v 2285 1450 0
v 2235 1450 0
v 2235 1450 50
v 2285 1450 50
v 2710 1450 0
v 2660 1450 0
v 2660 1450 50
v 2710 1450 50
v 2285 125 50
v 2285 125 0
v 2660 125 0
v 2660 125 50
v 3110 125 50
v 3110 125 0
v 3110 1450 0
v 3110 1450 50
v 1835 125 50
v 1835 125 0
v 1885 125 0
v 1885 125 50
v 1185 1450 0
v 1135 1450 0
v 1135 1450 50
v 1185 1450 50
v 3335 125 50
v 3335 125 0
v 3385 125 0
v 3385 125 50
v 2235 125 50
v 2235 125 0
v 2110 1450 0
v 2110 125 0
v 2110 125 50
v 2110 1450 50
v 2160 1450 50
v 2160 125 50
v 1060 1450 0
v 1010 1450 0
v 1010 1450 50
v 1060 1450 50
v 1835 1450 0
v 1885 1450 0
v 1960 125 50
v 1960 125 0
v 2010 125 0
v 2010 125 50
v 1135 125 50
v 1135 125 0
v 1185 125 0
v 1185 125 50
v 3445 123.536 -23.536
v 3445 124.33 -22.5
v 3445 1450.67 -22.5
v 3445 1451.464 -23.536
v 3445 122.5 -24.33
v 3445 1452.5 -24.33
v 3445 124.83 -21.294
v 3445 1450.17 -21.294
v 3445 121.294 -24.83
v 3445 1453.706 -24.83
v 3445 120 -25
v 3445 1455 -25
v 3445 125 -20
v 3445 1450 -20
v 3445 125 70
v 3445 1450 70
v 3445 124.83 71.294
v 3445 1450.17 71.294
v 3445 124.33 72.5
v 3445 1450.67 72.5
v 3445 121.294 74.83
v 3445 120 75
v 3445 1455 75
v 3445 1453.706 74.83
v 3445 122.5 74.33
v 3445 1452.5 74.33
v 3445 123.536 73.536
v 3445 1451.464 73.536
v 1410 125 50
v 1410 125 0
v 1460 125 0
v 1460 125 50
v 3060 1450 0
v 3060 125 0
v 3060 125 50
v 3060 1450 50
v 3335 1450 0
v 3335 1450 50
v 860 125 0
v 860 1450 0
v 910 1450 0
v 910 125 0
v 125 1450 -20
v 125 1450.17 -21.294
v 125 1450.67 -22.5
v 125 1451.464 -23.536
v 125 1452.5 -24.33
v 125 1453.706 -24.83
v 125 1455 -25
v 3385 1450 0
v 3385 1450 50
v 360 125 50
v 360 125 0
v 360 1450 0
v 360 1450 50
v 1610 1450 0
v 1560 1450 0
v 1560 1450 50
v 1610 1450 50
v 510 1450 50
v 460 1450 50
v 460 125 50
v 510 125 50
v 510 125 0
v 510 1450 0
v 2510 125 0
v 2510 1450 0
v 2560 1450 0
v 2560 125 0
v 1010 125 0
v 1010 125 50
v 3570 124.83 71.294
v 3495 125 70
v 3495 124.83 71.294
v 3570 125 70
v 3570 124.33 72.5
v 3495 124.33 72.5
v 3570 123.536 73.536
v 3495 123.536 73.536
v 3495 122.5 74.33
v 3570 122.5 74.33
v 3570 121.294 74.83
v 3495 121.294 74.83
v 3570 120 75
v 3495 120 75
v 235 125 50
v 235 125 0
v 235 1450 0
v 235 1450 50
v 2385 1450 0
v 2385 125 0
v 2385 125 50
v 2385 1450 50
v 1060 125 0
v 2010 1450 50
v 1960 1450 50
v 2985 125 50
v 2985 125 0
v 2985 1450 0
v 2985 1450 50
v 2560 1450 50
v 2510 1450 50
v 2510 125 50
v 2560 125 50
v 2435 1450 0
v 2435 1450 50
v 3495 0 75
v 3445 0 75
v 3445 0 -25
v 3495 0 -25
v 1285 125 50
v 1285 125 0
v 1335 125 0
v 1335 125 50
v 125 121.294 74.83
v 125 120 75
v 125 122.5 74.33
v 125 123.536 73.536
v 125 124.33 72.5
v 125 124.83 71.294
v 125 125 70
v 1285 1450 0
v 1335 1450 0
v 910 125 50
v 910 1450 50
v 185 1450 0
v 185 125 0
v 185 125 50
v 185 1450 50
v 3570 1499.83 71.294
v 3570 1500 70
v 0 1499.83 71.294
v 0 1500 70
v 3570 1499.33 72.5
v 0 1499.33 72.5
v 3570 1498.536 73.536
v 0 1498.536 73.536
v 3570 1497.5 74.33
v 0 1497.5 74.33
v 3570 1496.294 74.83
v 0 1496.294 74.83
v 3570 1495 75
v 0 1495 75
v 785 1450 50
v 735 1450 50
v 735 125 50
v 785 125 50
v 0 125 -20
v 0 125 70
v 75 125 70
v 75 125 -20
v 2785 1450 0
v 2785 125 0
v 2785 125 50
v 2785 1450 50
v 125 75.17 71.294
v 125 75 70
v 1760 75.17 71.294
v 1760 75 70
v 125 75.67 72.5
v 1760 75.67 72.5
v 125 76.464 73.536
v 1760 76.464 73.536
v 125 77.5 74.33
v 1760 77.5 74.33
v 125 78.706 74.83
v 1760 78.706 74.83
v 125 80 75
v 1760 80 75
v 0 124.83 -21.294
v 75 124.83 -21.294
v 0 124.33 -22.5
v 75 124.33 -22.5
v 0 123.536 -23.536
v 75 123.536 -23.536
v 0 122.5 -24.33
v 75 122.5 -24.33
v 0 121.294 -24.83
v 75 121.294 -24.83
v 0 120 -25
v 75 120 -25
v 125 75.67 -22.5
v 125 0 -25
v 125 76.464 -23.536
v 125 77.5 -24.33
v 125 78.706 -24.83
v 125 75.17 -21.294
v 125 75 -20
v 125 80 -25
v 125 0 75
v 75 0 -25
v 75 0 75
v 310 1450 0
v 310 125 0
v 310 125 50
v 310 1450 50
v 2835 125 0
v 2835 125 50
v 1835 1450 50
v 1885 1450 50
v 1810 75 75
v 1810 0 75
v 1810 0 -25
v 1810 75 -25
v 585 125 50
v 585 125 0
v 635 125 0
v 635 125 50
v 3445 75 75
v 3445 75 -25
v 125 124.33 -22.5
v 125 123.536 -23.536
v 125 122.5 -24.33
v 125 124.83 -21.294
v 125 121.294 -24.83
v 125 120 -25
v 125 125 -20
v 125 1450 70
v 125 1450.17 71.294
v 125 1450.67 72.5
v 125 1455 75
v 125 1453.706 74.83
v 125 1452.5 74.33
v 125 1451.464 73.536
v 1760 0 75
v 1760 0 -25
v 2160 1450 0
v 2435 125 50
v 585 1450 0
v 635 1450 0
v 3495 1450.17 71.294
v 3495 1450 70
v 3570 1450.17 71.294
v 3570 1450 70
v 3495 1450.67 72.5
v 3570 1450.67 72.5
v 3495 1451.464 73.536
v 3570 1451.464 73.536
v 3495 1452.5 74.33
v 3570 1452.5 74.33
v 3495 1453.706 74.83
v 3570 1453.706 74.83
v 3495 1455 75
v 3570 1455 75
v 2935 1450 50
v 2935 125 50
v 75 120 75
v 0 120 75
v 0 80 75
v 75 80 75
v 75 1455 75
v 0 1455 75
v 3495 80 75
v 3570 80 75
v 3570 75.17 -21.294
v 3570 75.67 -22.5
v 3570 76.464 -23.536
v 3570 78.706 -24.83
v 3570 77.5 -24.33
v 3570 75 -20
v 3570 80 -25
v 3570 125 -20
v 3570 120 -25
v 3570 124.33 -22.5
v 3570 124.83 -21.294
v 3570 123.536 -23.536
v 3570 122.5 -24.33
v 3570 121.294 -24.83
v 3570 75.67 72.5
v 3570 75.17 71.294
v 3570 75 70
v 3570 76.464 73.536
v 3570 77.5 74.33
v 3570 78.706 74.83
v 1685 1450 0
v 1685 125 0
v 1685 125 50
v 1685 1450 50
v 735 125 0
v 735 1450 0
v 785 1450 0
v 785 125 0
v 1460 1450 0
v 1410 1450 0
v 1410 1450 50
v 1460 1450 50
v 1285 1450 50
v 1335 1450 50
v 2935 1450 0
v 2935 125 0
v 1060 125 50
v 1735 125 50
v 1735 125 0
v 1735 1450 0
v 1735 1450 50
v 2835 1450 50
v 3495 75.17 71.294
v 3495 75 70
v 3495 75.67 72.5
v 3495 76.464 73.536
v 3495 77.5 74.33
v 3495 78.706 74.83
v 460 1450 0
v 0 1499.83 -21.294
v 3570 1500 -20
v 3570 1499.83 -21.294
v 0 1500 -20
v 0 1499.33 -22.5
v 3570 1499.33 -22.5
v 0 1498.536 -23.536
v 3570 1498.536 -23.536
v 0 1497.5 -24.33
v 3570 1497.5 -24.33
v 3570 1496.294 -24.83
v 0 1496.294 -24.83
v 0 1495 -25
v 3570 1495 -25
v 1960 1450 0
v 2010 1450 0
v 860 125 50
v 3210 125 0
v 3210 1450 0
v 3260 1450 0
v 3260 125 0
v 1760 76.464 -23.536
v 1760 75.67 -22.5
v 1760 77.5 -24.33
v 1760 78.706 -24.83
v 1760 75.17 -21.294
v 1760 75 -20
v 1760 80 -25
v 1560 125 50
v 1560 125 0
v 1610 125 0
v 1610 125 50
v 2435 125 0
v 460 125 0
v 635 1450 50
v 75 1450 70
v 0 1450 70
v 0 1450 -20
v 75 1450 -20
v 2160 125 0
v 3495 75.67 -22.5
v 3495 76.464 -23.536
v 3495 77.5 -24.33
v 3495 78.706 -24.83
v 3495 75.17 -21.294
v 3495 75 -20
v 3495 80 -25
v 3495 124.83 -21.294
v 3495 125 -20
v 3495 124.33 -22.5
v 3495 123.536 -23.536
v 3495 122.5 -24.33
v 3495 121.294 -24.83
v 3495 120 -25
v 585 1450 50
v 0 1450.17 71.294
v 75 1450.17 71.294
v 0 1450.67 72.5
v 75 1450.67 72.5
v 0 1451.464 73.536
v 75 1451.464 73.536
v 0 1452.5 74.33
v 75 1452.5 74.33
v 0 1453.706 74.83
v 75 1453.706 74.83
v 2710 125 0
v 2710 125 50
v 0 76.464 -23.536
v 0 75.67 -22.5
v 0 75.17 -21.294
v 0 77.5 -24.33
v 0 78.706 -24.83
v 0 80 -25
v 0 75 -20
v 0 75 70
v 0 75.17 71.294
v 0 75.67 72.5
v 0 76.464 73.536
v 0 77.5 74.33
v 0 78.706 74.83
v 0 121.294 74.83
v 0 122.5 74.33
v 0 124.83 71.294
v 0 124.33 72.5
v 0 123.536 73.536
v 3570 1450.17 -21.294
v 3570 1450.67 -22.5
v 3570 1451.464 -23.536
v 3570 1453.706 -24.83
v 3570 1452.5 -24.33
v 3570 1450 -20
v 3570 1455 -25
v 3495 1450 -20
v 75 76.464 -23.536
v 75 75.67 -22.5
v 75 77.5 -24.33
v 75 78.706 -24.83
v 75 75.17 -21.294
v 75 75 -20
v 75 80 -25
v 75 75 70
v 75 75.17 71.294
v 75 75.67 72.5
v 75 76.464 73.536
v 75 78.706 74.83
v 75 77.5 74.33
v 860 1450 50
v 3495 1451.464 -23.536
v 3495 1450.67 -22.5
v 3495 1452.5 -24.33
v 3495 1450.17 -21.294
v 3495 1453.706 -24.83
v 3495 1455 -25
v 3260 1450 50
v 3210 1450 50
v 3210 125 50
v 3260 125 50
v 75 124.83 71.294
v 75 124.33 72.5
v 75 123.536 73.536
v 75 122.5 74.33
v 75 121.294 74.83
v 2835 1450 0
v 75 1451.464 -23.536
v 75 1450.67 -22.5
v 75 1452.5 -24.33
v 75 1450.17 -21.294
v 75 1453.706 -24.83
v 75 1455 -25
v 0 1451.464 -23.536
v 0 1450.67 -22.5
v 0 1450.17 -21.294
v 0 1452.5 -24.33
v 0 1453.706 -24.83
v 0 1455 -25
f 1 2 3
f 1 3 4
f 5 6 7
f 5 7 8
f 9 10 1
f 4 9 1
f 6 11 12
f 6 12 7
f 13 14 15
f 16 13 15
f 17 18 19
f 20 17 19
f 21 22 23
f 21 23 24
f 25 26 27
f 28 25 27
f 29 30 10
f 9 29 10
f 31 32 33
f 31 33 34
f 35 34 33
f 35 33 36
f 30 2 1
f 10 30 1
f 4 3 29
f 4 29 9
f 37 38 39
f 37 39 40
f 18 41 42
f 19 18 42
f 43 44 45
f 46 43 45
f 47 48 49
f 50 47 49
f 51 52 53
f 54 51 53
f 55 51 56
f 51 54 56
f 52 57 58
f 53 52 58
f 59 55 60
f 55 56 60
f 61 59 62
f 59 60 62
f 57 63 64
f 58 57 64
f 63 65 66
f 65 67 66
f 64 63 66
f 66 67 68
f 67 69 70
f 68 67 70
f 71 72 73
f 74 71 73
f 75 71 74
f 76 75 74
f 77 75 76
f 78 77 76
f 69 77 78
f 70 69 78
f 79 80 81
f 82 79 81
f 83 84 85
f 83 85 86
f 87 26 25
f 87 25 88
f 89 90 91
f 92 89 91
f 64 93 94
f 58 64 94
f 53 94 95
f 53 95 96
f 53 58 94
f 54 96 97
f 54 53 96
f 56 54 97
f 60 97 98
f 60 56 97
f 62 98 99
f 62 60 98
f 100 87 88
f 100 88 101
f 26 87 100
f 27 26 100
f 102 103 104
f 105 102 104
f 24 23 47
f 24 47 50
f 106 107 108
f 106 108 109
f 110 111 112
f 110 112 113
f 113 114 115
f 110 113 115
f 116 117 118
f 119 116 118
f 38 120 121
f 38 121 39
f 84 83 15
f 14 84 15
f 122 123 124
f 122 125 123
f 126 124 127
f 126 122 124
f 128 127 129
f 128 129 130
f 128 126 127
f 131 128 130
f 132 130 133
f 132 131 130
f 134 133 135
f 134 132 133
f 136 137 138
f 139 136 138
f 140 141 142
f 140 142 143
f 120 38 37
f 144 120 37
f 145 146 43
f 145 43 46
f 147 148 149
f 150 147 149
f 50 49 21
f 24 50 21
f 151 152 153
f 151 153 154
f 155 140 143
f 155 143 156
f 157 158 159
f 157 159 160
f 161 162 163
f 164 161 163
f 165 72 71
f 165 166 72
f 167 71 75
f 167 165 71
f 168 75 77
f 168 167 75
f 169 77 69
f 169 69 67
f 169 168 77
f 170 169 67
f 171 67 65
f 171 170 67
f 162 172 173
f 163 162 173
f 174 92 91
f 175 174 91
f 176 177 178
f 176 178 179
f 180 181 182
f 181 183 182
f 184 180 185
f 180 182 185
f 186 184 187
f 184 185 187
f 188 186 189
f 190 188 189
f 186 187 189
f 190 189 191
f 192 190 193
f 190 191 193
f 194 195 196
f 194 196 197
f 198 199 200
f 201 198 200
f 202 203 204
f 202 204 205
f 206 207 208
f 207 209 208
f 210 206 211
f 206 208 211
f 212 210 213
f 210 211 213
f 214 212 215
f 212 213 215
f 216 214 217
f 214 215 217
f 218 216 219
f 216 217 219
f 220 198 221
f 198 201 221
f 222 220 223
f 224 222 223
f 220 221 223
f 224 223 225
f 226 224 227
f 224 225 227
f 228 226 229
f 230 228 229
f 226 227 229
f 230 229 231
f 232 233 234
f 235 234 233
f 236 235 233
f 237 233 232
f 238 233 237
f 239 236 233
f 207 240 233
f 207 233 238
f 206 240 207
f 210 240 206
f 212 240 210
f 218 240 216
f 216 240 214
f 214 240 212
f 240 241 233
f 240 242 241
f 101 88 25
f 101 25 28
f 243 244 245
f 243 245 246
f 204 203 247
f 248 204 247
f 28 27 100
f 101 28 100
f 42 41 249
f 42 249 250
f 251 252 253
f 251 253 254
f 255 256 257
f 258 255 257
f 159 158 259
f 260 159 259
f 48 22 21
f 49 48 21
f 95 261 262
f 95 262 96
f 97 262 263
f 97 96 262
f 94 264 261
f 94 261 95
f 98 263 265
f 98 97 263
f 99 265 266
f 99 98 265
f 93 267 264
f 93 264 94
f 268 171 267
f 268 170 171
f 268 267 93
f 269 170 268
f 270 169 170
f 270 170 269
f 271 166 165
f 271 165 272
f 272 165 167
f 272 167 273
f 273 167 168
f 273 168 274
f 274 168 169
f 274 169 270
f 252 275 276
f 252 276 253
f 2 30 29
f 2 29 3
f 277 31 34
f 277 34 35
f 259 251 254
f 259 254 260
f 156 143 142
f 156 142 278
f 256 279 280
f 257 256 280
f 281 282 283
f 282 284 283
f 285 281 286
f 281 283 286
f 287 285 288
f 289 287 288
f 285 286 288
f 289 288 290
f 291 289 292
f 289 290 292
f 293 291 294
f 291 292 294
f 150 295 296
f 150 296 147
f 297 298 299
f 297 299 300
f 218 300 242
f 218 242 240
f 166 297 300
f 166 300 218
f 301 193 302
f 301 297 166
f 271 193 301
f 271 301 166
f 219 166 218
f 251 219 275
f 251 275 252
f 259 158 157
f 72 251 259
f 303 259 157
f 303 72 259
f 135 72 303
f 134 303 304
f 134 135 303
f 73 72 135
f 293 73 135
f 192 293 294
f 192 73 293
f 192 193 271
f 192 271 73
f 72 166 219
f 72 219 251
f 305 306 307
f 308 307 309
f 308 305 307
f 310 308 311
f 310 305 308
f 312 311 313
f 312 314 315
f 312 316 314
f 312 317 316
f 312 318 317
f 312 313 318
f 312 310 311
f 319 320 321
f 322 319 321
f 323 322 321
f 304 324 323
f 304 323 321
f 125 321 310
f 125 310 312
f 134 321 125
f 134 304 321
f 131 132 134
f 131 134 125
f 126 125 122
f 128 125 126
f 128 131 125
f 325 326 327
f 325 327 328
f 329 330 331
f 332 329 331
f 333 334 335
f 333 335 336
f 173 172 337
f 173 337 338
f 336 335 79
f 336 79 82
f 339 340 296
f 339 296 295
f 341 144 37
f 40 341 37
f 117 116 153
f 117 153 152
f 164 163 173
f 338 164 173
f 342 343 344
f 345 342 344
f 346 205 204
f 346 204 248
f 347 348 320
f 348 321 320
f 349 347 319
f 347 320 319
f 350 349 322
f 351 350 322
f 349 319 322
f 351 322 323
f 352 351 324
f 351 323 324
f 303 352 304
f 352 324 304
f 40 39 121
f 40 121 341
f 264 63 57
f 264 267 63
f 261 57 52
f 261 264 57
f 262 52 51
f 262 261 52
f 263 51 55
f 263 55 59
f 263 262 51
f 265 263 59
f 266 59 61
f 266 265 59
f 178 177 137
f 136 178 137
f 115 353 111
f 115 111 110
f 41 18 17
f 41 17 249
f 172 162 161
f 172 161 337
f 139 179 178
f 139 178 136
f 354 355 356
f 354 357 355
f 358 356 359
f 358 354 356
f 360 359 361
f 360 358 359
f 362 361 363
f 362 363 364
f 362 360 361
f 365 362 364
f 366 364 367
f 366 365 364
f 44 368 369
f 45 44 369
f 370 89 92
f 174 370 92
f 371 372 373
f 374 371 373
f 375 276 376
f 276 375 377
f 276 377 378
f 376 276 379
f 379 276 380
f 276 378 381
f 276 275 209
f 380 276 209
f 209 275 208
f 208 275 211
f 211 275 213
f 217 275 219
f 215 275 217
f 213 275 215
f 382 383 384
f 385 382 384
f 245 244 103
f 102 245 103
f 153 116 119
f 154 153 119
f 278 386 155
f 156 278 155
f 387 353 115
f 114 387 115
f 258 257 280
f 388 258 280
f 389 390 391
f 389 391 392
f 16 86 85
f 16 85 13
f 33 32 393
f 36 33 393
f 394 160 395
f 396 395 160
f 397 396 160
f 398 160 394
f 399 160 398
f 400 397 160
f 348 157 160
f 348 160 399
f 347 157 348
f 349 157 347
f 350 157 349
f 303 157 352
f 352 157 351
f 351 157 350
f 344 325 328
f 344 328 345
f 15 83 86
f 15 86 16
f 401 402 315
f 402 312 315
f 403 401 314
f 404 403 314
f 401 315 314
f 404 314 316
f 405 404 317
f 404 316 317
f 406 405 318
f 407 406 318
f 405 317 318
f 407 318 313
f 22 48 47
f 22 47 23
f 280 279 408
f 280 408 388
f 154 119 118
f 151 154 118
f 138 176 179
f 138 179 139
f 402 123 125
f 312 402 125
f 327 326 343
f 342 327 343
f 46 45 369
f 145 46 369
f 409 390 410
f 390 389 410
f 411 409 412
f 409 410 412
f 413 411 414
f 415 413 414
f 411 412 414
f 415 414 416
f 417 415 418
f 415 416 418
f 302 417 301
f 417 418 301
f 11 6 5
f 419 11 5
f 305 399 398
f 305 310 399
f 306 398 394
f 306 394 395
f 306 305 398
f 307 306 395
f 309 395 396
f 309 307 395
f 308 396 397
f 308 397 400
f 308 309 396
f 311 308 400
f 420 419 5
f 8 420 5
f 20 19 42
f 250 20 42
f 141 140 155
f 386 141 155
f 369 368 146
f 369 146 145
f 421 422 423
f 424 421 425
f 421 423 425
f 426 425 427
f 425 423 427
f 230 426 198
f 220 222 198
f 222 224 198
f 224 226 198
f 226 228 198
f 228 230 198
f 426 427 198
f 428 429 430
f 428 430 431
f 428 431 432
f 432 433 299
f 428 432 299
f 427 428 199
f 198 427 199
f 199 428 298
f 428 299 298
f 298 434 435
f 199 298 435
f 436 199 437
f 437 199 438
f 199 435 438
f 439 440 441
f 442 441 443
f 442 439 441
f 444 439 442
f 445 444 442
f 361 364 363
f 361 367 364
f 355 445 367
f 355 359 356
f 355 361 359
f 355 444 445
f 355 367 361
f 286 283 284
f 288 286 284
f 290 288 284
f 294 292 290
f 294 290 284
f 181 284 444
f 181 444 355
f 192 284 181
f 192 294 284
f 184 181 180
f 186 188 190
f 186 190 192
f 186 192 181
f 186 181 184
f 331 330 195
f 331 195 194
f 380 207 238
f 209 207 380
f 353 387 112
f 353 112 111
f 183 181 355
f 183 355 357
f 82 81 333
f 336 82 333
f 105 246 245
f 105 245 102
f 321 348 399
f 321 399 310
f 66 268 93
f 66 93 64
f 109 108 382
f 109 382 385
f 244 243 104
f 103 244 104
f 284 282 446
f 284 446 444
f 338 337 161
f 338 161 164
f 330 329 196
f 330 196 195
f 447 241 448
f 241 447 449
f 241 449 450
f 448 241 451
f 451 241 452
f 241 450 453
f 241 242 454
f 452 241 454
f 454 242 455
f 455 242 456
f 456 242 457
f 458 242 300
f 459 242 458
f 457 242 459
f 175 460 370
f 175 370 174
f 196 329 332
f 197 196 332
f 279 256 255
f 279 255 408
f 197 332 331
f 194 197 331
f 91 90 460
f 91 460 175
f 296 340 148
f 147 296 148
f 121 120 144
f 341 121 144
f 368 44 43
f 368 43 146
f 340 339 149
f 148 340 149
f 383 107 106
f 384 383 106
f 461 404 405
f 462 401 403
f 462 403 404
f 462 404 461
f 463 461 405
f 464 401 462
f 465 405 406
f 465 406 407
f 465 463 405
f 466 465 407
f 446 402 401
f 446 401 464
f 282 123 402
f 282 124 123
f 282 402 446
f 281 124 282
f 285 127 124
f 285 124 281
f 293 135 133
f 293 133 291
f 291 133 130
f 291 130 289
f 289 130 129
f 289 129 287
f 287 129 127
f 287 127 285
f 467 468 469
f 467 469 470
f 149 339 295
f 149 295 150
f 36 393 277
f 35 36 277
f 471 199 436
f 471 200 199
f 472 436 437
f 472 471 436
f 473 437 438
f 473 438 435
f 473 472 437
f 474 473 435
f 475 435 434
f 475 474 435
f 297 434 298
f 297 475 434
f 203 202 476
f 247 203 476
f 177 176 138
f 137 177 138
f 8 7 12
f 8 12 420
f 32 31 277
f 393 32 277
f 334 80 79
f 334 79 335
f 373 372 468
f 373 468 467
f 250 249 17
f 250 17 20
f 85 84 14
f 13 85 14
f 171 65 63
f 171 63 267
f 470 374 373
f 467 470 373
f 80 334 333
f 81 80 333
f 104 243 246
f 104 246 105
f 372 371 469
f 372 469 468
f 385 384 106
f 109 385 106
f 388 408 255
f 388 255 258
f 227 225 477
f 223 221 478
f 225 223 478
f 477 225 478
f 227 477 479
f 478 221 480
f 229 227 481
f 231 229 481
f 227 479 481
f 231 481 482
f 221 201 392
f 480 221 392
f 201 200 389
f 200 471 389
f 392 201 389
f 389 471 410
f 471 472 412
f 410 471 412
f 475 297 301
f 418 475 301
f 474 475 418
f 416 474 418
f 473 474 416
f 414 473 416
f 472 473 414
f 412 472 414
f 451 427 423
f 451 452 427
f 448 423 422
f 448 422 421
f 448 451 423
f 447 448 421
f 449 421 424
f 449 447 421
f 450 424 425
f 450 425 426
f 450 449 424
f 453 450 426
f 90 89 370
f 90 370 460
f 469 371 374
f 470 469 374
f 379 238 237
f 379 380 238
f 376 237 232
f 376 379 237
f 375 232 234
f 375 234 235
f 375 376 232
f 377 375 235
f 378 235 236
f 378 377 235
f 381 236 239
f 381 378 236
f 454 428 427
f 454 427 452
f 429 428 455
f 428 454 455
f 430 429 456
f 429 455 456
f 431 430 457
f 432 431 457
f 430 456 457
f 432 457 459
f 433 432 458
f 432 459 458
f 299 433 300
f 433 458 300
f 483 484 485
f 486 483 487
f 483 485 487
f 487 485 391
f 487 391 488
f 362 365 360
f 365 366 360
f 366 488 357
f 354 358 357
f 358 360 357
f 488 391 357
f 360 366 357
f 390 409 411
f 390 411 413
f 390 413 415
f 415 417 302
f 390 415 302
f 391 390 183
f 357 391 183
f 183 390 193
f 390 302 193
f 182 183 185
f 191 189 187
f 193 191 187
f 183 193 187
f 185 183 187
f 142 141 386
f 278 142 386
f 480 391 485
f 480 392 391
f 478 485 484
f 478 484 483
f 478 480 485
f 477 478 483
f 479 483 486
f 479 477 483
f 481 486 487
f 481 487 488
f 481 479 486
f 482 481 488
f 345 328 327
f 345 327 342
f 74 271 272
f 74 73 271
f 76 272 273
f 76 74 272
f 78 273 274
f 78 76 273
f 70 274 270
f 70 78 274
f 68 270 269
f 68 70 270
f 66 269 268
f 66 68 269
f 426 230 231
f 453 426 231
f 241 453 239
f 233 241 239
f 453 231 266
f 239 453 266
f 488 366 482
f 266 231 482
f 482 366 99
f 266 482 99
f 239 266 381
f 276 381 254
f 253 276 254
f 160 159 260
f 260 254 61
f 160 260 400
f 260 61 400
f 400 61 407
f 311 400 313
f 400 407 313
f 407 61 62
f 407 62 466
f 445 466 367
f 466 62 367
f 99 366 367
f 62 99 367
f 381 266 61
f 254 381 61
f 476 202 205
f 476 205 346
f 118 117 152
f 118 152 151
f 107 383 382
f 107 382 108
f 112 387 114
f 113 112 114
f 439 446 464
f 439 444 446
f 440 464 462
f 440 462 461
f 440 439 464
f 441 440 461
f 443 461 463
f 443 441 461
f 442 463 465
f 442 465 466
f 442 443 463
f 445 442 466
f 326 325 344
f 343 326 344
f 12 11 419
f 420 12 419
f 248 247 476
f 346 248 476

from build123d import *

# Parameters (mm, degrees)
F0_W          = 75
F0_H          = 50
F0_W_2        = 50
F0_W_3        = 3320
F0_H_2        = 1325
F0_H_3        = 75
F1_DEPTH      = 75
F1_DEPTH_BACK = 25
F2_R          = 5
F3_W          = 50
F3_H          = 1325
F4_DEPTH      = 50


with BuildPart() as f1:
    # F0 (on Top) → F1 (new body, two sides)
    with BuildSketch(Plane.XY) as f1_sk:
        with Locations((37.5, 1475)):
            Rectangle(F0_W, F0_H)
        with Locations((100, 1475)):
            Rectangle(F0_W_2, F0_H)
        with Locations((1785, 1475)):
            Rectangle(F0_W_3, F0_H)
        with Locations((100, 787.5)):
            Rectangle(F0_W_2, F0_H_2)
        with Locations((3470, 1475)):
            Rectangle(F0_W_2, F0_H)
        with Locations((37.5, 100)):
            Rectangle(F0_W, F0_H)
        with Locations((100, 100)):
            Rectangle(F0_W_2, F0_H)
        with Locations((3532.5, 1475)):
            Rectangle(F0_W, F0_H)
        with Locations((3470, 787.5)):
            Rectangle(F0_W_2, F0_H_2)
        Polygon((3445, 125), (125, 125), (125, 75), (1760, 75), (1810, 75), (3445, 75), align=None)
        with Locations((100, 37.5)):
            Rectangle(F0_W_2, F0_H_3)
        with Locations((3470, 100)):
            Rectangle(F0_W_2, F0_H)
        with Locations((3532.5, 100)):
            Rectangle(F0_W, F0_H)
        with Locations((3470, 37.5)):
            Rectangle(F0_W_2, F0_H_3)
        with Locations((1785, 37.5)):
            Rectangle(F0_W_2, F0_H_3)
    extrude(amount=F1_DEPTH)
    extrude(f1_sk.sketch, amount=-F1_DEPTH_BACK)

    # F2
    f2_edges = [f1.edges().sort_by_distance(p)[0] for p in [
        (1785, 1450, 75),
        (1785, 1500, 75),
        (1785, 125, 75),
        (942.5, 75, 75),
        (37.5, 75, 75),
        (37.5, 125, 75),
        (3532.5, 125, 75),
        (3532.5, 75, 75),
        (3532.5, 1450, 75),
        (37.5, 1450, 75),
        (1785, 1500, -25),
        (1785, 1450, -25),
        (3532.5, 1450, -25),
        (3532.5, 75, -25),
        (3532.5, 125, -25),
        (1785, 125, -25),
        (942.5, 75, -25),
        (37.5, 125, -25),
        (37.5, 75, -25),
        (37.5, 1450, -25),
    ]]
    fillet(f2_edges, radius=F2_R)


with BuildPart() as f4:
    # F3 (on Top) → F4 (new body)
    with BuildSketch(Plane.XY):
        with Locations((210, 787.5)):
            Rectangle(F3_W, F3_H)
    extrude(amount=F4_DEPTH)


with BuildPart() as f4b:
    # F3 (on Top) → F4, piece 2 (new body)
    with BuildSketch(Plane.XY):
        with Locations((335, 787.5)):
            Rectangle(F3_W, F3_H)
    extrude(amount=F4_DEPTH)


with BuildPart() as f4c:
    # F3 (on Top) → F4, piece 3 (new body)
    with BuildSketch(Plane.XY):
        with Locations((610, 787.5)):
            Rectangle(F3_W, F3_H)
    extrude(amount=F4_DEPTH)


with BuildPart() as f4d:
    # F3 (on Top) → F4, piece 4 (new body)
    with BuildSketch(Plane.XY):
        with Locations((485, 787.5)):
            Rectangle(F3_W, F3_H)
    extrude(amount=F4_DEPTH)


with BuildPart() as f4e:
    # F3 (on Top) → F4, piece 5 (new body)
    with BuildSketch(Plane.XY):
        with Locations((885, 787.5)):
            Rectangle(F3_W, F3_H)
    extrude(amount=F4_DEPTH)


with BuildPart() as f4f:
    # F3 (on Top) → F4, piece 6 (new body)
    with BuildSketch(Plane.XY):
        with Locations((760, 787.5)):
            Rectangle(F3_W, F3_H)
    extrude(amount=F4_DEPTH)


with BuildPart() as f4g:
    # F3 (on Top) → F4, piece 7 (new body)
    with BuildSketch(Plane.XY):
        with Locations((1160, 787.5)):
            Rectangle(F3_W, F3_H)
    extrude(amount=F4_DEPTH)


with BuildPart() as f4h:
    # F3 (on Top) → F4, piece 8 (new body)
    with BuildSketch(Plane.XY):
        with Locations((1035, 787.5)):
            Rectangle(F3_W, F3_H)
    extrude(amount=F4_DEPTH)


with BuildPart() as f4i:
    # F3 (on Top) → F4, piece 9 (new body)
    with BuildSketch(Plane.XY):
        with Locations((1435, 787.5)):
            Rectangle(F3_W, F3_H)
    extrude(amount=F4_DEPTH)


with BuildPart() as f4j:
    # F3 (on Top) → F4, piece 10 (new body)
    with BuildSketch(Plane.XY):
        with Locations((1310, 787.5)):
            Rectangle(F3_W, F3_H)
    extrude(amount=F4_DEPTH)


with BuildPart() as f4k:
    # F3 (on Top) → F4, piece 11 (new body)
    with BuildSketch(Plane.XY):
        with Locations((1710, 787.5)):
            Rectangle(F3_W, F3_H)
    extrude(amount=F4_DEPTH)


with BuildPart() as f4l:
    # F3 (on Top) → F4, piece 12 (new body)
    with BuildSketch(Plane.XY):
        with Locations((1585, 787.5)):
            Rectangle(F3_W, F3_H)
    extrude(amount=F4_DEPTH)


with BuildPart() as f4m:
    # F3 (on Top) → F4, piece 13 (new body)
    with BuildSketch(Plane.XY):
        with Locations((1985, 787.5)):
            Rectangle(F3_W, F3_H)
    extrude(amount=F4_DEPTH)


with BuildPart() as f4n:
    # F3 (on Top) → F4, piece 14 (new body)
    with BuildSketch(Plane.XY):
        with Locations((1860, 787.5)):
            Rectangle(F3_W, F3_H)
    extrude(amount=F4_DEPTH)


with BuildPart() as f4o:
    # F3 (on Top) → F4, piece 15 (new body)
    with BuildSketch(Plane.XY):
        with Locations((2260, 787.5)):
            Rectangle(F3_W, F3_H)
    extrude(amount=F4_DEPTH)


with BuildPart() as f4p:
    # F3 (on Top) → F4, piece 16 (new body)
    with BuildSketch(Plane.XY):
        with Locations((2135, 787.5)):
            Rectangle(F3_W, F3_H)
    extrude(amount=F4_DEPTH)


with BuildPart() as f4q:
    # F3 (on Top) → F4, piece 17 (new body)
    with BuildSketch(Plane.XY):
        with Locations((2535, 787.5)):
            Rectangle(F3_W, F3_H)
    extrude(amount=F4_DEPTH)


with BuildPart() as f4r:
    # F3 (on Top) → F4, piece 18 (new body)
    with BuildSketch(Plane.XY):
        with Locations((2410, 787.5)):
            Rectangle(F3_W, F3_H)
    extrude(amount=F4_DEPTH)


with BuildPart() as f4s:
    # F3 (on Top) → F4, piece 19 (new body)
    with BuildSketch(Plane.XY):
        with Locations((2810, 787.5)):
            Rectangle(F3_W, F3_H)
    extrude(amount=F4_DEPTH)


with BuildPart() as f4t:
    # F3 (on Top) → F4, piece 20 (new body)
    with BuildSketch(Plane.XY):
        with Locations((2685, 787.5)):
            Rectangle(F3_W, F3_H)
    extrude(amount=F4_DEPTH)


with BuildPart() as f4u:
    # F3 (on Top) → F4, piece 21 (new body)
    with BuildSketch(Plane.XY):
        with Locations((3085, 787.5)):
            Rectangle(F3_W, F3_H)
    extrude(amount=F4_DEPTH)


with BuildPart() as f4v:
    # F3 (on Top) → F4, piece 22 (new body)
    with BuildSketch(Plane.XY):
        with Locations((2960, 787.5)):
            Rectangle(F3_W, F3_H)
    extrude(amount=F4_DEPTH)


with BuildPart() as f4w:
    # F3 (on Top) → F4, piece 23 (new body)
    with BuildSketch(Plane.XY):
        with Locations((3360, 787.5)):
            Rectangle(F3_W, F3_H)
    extrude(amount=F4_DEPTH)


with BuildPart() as f4x:
    # F3 (on Top) → F4, piece 24 (new body)
    with BuildSketch(Plane.XY):
        with Locations((3235, 787.5)):
            Rectangle(F3_W, F3_H)
    extrude(amount=F4_DEPTH)


solid = Compound([f1.part, f4.part, f4b.part, f4c.part, f4d.part, f4e.part, f4f.part, f4g.part, f4h.part, f4i.part, f4j.part, f4k.part, f4l.part, f4m.part, f4n.part, f4o.part, f4p.part, f4q.part, f4r.part, f4s.part, f4t.part, f4u.part, f4v.part, f4w.part, f4x.part])
